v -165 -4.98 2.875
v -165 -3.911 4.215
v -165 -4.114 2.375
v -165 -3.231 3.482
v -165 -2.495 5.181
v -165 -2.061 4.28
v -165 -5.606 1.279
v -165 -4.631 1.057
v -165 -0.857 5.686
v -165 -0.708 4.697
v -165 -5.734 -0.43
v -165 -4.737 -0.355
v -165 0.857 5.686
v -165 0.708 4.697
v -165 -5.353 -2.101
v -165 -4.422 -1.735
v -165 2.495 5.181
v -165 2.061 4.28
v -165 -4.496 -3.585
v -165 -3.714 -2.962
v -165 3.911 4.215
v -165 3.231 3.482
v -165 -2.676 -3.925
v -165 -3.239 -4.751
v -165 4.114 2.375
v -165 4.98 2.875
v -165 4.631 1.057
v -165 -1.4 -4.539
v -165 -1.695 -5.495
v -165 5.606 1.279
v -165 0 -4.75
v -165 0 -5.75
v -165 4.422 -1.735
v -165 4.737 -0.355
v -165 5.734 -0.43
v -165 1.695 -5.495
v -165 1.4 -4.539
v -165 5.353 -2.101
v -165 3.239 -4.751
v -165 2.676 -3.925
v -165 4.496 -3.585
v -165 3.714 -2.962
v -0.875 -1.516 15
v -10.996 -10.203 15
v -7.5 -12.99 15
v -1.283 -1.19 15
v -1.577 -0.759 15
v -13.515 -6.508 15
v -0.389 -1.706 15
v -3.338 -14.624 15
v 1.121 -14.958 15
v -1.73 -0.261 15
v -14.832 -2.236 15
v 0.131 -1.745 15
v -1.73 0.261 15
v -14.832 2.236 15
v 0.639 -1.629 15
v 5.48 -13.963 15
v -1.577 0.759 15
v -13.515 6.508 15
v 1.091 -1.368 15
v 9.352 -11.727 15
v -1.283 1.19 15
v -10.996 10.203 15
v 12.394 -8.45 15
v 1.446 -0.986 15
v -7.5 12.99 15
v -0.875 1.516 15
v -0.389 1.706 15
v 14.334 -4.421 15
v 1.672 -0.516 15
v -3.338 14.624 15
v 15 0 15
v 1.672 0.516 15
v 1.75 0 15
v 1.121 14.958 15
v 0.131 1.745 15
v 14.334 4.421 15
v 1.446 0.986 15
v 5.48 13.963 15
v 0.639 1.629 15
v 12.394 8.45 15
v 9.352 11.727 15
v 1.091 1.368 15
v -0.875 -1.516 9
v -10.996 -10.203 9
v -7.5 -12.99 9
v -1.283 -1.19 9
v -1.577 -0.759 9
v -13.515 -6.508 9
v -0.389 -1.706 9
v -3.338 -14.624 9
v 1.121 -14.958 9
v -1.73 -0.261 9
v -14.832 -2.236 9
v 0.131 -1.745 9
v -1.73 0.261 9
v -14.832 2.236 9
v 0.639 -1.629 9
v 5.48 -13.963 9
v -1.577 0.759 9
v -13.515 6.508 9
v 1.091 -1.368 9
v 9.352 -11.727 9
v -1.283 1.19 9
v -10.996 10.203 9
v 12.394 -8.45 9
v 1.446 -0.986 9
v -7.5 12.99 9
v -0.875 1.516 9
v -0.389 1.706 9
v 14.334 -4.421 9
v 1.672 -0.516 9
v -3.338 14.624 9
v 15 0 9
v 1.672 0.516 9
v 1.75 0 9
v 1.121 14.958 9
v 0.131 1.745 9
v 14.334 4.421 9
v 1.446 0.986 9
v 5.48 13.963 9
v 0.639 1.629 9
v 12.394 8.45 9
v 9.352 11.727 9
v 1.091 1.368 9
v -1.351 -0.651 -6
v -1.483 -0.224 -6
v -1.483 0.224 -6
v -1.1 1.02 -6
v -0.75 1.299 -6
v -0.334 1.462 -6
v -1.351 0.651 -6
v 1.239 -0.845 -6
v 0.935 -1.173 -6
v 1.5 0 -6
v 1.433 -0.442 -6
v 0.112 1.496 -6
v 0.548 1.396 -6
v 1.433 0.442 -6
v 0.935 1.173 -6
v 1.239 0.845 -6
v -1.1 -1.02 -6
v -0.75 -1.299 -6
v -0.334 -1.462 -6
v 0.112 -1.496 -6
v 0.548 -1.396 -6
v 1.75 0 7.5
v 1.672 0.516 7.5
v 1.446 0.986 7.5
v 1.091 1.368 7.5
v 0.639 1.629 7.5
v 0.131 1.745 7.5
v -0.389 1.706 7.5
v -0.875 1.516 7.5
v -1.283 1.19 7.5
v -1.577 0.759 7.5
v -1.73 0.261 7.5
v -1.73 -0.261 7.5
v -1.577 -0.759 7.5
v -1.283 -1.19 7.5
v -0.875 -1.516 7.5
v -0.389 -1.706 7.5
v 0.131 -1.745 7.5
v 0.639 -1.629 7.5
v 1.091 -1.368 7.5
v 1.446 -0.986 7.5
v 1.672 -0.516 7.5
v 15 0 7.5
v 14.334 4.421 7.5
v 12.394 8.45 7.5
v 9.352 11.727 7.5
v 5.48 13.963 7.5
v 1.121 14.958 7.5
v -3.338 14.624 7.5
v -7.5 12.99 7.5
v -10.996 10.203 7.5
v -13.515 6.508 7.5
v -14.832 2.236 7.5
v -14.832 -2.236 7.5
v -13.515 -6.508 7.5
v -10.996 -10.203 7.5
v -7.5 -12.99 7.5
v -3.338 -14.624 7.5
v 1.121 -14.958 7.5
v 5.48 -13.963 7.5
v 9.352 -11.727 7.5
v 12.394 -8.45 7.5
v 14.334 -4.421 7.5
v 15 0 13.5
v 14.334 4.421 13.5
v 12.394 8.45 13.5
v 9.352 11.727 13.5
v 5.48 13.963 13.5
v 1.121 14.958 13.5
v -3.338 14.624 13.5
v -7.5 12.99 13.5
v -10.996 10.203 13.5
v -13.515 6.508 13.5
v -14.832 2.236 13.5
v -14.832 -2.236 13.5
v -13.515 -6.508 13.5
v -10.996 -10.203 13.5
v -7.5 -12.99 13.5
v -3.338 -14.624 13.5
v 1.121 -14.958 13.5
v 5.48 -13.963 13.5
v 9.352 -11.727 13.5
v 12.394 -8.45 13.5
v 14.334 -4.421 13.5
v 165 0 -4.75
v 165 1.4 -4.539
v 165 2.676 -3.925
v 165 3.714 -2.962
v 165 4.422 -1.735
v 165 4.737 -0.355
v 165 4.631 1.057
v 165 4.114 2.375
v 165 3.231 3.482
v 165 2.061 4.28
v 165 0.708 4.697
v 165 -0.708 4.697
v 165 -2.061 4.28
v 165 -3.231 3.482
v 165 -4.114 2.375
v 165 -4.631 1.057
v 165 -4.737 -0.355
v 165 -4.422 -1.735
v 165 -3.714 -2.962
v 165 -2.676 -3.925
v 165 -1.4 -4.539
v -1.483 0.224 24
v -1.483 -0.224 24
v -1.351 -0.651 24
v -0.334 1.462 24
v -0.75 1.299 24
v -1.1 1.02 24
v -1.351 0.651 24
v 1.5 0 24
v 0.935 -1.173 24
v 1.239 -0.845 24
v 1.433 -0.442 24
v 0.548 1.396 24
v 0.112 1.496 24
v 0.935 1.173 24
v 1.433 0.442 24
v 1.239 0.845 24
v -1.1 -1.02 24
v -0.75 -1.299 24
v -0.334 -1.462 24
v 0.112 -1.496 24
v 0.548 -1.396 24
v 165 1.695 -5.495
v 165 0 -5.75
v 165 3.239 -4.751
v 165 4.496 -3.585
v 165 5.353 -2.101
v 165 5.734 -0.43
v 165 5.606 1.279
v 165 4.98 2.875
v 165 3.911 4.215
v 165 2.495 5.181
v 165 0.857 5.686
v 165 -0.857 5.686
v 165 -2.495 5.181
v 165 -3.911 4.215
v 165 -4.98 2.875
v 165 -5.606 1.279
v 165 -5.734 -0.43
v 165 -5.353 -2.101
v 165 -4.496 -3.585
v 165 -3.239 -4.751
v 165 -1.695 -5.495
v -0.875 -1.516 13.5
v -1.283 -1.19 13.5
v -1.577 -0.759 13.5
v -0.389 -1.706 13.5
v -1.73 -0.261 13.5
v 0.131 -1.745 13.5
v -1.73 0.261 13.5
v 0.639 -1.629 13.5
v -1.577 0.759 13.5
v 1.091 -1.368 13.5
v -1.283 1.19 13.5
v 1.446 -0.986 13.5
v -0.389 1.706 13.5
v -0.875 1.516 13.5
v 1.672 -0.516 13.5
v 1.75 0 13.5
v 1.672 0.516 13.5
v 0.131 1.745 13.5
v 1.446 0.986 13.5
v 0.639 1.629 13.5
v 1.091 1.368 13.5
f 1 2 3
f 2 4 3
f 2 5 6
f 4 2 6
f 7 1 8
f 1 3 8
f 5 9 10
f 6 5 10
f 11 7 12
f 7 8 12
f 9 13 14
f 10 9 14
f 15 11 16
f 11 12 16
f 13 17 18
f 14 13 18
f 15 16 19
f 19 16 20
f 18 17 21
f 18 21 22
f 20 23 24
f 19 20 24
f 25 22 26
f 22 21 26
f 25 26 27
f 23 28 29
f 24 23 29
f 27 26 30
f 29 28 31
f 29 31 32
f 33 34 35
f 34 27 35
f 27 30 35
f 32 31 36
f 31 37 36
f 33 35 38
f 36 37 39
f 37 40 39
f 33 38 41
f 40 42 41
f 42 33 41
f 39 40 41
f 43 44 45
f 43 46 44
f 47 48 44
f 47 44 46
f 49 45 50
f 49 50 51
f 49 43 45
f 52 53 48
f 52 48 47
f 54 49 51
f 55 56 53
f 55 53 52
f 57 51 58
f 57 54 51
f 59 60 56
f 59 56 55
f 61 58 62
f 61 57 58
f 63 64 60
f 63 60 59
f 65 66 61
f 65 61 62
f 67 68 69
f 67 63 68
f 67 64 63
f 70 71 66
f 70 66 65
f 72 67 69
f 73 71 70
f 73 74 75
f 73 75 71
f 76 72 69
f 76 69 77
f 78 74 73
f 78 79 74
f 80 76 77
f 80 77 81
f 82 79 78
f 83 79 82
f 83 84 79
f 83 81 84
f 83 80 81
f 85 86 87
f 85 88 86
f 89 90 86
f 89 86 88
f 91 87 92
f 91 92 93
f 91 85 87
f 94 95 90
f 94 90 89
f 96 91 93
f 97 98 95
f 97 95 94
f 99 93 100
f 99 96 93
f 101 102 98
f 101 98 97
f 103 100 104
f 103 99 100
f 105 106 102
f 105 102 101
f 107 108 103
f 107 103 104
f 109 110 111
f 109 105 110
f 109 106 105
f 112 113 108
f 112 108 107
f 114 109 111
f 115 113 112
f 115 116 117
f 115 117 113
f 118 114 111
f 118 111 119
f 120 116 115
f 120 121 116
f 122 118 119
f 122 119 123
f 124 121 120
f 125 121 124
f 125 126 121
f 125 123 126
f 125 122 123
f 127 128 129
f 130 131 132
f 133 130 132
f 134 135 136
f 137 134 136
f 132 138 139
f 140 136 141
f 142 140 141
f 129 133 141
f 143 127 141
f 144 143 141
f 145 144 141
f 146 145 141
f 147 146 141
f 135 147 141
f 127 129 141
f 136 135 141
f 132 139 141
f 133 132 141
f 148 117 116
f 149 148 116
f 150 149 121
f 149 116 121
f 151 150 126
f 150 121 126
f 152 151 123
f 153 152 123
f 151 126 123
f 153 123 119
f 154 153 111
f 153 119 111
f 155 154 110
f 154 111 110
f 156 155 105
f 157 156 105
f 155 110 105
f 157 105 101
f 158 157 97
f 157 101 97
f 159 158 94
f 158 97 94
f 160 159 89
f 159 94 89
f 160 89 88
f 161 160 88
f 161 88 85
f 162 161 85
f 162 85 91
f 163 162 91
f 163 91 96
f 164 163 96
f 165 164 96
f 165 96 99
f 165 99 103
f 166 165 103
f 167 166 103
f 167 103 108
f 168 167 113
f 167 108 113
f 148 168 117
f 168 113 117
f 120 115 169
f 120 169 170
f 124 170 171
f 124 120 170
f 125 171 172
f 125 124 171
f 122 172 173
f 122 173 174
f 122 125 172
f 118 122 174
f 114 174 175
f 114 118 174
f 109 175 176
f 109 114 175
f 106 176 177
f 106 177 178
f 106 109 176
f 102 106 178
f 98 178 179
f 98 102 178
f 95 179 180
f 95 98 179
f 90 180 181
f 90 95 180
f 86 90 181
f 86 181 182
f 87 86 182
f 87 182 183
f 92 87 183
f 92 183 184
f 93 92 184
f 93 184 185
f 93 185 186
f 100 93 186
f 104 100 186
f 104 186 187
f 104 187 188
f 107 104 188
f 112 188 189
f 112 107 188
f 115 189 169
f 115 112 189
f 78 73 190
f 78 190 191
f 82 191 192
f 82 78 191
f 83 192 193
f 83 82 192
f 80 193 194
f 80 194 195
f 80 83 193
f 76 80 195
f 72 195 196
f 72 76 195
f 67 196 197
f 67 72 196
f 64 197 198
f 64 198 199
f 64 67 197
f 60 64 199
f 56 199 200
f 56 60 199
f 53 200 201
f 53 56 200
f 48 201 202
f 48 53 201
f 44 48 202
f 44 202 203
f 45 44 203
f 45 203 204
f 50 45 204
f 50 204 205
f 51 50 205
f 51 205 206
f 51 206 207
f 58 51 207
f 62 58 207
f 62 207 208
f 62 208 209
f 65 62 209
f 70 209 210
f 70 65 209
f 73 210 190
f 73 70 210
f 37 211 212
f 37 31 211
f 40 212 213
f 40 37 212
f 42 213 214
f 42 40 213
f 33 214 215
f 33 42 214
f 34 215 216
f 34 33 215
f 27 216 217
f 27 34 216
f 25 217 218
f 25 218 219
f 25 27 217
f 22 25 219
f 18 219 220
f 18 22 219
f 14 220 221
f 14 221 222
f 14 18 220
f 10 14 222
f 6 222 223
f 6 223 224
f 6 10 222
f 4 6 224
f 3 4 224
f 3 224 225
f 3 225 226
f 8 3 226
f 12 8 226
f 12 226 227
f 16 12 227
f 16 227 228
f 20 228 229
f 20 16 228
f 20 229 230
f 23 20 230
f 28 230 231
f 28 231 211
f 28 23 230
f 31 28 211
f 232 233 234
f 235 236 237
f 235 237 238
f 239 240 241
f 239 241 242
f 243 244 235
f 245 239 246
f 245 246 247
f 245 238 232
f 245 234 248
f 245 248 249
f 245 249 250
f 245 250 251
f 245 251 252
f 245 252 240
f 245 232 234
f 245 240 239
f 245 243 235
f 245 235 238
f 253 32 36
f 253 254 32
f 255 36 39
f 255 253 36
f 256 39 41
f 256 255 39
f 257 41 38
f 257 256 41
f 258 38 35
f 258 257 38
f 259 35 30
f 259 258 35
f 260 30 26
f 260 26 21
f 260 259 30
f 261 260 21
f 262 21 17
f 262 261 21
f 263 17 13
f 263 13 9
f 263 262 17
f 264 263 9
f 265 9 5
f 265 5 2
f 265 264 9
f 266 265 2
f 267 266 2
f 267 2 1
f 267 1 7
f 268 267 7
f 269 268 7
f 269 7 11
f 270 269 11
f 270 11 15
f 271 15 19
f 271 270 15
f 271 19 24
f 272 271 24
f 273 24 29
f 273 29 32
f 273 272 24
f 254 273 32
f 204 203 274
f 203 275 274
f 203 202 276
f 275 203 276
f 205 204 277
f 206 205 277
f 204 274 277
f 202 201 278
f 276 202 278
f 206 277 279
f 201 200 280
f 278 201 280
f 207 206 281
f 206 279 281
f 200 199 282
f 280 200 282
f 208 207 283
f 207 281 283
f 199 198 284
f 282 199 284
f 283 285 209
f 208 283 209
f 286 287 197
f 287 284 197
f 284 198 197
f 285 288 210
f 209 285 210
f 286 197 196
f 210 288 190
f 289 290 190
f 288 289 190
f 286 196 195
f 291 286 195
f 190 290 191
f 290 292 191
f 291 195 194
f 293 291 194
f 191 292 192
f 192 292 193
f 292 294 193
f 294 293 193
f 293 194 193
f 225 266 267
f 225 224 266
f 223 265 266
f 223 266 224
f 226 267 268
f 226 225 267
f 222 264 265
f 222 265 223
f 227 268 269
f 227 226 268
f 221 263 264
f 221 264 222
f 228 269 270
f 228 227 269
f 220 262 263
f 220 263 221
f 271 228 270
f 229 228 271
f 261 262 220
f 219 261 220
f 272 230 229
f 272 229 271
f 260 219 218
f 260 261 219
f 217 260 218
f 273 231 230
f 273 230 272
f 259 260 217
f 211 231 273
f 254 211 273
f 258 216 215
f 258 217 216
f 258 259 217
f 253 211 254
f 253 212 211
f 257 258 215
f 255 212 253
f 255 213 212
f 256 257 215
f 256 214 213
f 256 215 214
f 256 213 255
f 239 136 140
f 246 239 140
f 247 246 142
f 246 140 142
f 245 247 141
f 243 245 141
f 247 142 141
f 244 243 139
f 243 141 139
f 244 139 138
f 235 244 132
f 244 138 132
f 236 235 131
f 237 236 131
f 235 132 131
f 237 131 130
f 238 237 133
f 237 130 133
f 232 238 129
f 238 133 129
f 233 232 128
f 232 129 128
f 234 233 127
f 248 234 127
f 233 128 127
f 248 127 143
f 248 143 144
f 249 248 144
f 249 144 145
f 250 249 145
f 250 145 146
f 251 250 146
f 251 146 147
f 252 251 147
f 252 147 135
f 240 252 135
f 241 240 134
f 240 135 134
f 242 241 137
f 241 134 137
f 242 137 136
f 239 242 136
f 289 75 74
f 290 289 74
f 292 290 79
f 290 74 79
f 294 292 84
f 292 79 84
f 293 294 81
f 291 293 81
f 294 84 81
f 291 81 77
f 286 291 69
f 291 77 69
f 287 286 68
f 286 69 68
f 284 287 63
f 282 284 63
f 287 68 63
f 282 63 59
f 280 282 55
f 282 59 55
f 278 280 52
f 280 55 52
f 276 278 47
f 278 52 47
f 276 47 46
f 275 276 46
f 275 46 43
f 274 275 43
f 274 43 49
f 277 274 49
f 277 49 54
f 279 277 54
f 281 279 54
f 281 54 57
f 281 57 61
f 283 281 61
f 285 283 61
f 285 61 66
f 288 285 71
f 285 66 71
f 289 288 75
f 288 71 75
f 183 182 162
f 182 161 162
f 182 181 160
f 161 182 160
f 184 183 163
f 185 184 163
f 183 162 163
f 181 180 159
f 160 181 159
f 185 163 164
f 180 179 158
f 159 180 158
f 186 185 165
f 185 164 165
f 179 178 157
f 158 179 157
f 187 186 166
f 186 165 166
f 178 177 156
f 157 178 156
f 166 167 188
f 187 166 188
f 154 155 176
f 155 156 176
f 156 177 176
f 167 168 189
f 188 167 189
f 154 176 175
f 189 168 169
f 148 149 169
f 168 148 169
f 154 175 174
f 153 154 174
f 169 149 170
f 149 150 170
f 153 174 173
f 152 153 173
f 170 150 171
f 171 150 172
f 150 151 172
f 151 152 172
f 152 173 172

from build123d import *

# Parameters (mm, degrees)
ESQUISSE1_R                = 5.75
ESQUISSE1_R_2              = 4.75
EXTRU_MINCE1_DEPTH         = 165
BOSS_EXTRU_1_START         = -6
ESQUISSE2_R                = 1.5
BOSS_EXTRU_1_DEPTH         = 30
BOSS_EXTRU_2_START         = -9
ESQUISSE3_R                = 15
ESQUISSE3_R_2              = 1.75
BOSS_EXTRU_2_DEPTH         = 1.5
R_P_TITION_LIN_AIRE1_COUNT = 2
R_P_TITION_LIN_AIRE1_PITCH = 6


with BuildPart() as part:
    # Esquisse1 → Extru.-Mince1 (new, symmetric)
    with BuildSketch(Plane(origin=(0, 0, 0), x_dir=(0, 0, -1), z_dir=(1, 0, 0))):
        Circle(ESQUISSE1_R)
        Circle(ESQUISSE1_R_2, mode=Mode.SUBTRACT)
    extrude(amount=EXTRU_MINCE1_DEPTH, both=True)


with BuildPart() as body_2:
    # Esquisse2 → Boss.-Extru.1 (new body)
    with BuildSketch(Plane.XY.offset(BOSS_EXTRU_1_START)):
        Circle(ESQUISSE2_R)
    extrude(amount=BOSS_EXTRU_1_DEPTH)


with BuildPart() as body_3:
    # Esquisse3 → Boss.-Extru.2 (new body)
    with BuildSketch(Plane.XY.offset(24).offset(BOSS_EXTRU_2_START)):
        Circle(ESQUISSE3_R)
        Circle(ESQUISSE3_R_2, mode=Mode.SUBTRACT)
    extrude(amount=-BOSS_EXTRU_2_DEPTH)


with BuildPart() as r_p_tition_lin_aire1_1:
    # Répétition linéaire1: pattern copy
    add(body_3.part.moved(Location(Vector(0, 0, -1) * (1 * R_P_TITION_LIN_AIRE1_PITCH))))


solid = Compound([part.part, body_2.part, body_3.part, r_p_tition_lin_aire1_1.part])
